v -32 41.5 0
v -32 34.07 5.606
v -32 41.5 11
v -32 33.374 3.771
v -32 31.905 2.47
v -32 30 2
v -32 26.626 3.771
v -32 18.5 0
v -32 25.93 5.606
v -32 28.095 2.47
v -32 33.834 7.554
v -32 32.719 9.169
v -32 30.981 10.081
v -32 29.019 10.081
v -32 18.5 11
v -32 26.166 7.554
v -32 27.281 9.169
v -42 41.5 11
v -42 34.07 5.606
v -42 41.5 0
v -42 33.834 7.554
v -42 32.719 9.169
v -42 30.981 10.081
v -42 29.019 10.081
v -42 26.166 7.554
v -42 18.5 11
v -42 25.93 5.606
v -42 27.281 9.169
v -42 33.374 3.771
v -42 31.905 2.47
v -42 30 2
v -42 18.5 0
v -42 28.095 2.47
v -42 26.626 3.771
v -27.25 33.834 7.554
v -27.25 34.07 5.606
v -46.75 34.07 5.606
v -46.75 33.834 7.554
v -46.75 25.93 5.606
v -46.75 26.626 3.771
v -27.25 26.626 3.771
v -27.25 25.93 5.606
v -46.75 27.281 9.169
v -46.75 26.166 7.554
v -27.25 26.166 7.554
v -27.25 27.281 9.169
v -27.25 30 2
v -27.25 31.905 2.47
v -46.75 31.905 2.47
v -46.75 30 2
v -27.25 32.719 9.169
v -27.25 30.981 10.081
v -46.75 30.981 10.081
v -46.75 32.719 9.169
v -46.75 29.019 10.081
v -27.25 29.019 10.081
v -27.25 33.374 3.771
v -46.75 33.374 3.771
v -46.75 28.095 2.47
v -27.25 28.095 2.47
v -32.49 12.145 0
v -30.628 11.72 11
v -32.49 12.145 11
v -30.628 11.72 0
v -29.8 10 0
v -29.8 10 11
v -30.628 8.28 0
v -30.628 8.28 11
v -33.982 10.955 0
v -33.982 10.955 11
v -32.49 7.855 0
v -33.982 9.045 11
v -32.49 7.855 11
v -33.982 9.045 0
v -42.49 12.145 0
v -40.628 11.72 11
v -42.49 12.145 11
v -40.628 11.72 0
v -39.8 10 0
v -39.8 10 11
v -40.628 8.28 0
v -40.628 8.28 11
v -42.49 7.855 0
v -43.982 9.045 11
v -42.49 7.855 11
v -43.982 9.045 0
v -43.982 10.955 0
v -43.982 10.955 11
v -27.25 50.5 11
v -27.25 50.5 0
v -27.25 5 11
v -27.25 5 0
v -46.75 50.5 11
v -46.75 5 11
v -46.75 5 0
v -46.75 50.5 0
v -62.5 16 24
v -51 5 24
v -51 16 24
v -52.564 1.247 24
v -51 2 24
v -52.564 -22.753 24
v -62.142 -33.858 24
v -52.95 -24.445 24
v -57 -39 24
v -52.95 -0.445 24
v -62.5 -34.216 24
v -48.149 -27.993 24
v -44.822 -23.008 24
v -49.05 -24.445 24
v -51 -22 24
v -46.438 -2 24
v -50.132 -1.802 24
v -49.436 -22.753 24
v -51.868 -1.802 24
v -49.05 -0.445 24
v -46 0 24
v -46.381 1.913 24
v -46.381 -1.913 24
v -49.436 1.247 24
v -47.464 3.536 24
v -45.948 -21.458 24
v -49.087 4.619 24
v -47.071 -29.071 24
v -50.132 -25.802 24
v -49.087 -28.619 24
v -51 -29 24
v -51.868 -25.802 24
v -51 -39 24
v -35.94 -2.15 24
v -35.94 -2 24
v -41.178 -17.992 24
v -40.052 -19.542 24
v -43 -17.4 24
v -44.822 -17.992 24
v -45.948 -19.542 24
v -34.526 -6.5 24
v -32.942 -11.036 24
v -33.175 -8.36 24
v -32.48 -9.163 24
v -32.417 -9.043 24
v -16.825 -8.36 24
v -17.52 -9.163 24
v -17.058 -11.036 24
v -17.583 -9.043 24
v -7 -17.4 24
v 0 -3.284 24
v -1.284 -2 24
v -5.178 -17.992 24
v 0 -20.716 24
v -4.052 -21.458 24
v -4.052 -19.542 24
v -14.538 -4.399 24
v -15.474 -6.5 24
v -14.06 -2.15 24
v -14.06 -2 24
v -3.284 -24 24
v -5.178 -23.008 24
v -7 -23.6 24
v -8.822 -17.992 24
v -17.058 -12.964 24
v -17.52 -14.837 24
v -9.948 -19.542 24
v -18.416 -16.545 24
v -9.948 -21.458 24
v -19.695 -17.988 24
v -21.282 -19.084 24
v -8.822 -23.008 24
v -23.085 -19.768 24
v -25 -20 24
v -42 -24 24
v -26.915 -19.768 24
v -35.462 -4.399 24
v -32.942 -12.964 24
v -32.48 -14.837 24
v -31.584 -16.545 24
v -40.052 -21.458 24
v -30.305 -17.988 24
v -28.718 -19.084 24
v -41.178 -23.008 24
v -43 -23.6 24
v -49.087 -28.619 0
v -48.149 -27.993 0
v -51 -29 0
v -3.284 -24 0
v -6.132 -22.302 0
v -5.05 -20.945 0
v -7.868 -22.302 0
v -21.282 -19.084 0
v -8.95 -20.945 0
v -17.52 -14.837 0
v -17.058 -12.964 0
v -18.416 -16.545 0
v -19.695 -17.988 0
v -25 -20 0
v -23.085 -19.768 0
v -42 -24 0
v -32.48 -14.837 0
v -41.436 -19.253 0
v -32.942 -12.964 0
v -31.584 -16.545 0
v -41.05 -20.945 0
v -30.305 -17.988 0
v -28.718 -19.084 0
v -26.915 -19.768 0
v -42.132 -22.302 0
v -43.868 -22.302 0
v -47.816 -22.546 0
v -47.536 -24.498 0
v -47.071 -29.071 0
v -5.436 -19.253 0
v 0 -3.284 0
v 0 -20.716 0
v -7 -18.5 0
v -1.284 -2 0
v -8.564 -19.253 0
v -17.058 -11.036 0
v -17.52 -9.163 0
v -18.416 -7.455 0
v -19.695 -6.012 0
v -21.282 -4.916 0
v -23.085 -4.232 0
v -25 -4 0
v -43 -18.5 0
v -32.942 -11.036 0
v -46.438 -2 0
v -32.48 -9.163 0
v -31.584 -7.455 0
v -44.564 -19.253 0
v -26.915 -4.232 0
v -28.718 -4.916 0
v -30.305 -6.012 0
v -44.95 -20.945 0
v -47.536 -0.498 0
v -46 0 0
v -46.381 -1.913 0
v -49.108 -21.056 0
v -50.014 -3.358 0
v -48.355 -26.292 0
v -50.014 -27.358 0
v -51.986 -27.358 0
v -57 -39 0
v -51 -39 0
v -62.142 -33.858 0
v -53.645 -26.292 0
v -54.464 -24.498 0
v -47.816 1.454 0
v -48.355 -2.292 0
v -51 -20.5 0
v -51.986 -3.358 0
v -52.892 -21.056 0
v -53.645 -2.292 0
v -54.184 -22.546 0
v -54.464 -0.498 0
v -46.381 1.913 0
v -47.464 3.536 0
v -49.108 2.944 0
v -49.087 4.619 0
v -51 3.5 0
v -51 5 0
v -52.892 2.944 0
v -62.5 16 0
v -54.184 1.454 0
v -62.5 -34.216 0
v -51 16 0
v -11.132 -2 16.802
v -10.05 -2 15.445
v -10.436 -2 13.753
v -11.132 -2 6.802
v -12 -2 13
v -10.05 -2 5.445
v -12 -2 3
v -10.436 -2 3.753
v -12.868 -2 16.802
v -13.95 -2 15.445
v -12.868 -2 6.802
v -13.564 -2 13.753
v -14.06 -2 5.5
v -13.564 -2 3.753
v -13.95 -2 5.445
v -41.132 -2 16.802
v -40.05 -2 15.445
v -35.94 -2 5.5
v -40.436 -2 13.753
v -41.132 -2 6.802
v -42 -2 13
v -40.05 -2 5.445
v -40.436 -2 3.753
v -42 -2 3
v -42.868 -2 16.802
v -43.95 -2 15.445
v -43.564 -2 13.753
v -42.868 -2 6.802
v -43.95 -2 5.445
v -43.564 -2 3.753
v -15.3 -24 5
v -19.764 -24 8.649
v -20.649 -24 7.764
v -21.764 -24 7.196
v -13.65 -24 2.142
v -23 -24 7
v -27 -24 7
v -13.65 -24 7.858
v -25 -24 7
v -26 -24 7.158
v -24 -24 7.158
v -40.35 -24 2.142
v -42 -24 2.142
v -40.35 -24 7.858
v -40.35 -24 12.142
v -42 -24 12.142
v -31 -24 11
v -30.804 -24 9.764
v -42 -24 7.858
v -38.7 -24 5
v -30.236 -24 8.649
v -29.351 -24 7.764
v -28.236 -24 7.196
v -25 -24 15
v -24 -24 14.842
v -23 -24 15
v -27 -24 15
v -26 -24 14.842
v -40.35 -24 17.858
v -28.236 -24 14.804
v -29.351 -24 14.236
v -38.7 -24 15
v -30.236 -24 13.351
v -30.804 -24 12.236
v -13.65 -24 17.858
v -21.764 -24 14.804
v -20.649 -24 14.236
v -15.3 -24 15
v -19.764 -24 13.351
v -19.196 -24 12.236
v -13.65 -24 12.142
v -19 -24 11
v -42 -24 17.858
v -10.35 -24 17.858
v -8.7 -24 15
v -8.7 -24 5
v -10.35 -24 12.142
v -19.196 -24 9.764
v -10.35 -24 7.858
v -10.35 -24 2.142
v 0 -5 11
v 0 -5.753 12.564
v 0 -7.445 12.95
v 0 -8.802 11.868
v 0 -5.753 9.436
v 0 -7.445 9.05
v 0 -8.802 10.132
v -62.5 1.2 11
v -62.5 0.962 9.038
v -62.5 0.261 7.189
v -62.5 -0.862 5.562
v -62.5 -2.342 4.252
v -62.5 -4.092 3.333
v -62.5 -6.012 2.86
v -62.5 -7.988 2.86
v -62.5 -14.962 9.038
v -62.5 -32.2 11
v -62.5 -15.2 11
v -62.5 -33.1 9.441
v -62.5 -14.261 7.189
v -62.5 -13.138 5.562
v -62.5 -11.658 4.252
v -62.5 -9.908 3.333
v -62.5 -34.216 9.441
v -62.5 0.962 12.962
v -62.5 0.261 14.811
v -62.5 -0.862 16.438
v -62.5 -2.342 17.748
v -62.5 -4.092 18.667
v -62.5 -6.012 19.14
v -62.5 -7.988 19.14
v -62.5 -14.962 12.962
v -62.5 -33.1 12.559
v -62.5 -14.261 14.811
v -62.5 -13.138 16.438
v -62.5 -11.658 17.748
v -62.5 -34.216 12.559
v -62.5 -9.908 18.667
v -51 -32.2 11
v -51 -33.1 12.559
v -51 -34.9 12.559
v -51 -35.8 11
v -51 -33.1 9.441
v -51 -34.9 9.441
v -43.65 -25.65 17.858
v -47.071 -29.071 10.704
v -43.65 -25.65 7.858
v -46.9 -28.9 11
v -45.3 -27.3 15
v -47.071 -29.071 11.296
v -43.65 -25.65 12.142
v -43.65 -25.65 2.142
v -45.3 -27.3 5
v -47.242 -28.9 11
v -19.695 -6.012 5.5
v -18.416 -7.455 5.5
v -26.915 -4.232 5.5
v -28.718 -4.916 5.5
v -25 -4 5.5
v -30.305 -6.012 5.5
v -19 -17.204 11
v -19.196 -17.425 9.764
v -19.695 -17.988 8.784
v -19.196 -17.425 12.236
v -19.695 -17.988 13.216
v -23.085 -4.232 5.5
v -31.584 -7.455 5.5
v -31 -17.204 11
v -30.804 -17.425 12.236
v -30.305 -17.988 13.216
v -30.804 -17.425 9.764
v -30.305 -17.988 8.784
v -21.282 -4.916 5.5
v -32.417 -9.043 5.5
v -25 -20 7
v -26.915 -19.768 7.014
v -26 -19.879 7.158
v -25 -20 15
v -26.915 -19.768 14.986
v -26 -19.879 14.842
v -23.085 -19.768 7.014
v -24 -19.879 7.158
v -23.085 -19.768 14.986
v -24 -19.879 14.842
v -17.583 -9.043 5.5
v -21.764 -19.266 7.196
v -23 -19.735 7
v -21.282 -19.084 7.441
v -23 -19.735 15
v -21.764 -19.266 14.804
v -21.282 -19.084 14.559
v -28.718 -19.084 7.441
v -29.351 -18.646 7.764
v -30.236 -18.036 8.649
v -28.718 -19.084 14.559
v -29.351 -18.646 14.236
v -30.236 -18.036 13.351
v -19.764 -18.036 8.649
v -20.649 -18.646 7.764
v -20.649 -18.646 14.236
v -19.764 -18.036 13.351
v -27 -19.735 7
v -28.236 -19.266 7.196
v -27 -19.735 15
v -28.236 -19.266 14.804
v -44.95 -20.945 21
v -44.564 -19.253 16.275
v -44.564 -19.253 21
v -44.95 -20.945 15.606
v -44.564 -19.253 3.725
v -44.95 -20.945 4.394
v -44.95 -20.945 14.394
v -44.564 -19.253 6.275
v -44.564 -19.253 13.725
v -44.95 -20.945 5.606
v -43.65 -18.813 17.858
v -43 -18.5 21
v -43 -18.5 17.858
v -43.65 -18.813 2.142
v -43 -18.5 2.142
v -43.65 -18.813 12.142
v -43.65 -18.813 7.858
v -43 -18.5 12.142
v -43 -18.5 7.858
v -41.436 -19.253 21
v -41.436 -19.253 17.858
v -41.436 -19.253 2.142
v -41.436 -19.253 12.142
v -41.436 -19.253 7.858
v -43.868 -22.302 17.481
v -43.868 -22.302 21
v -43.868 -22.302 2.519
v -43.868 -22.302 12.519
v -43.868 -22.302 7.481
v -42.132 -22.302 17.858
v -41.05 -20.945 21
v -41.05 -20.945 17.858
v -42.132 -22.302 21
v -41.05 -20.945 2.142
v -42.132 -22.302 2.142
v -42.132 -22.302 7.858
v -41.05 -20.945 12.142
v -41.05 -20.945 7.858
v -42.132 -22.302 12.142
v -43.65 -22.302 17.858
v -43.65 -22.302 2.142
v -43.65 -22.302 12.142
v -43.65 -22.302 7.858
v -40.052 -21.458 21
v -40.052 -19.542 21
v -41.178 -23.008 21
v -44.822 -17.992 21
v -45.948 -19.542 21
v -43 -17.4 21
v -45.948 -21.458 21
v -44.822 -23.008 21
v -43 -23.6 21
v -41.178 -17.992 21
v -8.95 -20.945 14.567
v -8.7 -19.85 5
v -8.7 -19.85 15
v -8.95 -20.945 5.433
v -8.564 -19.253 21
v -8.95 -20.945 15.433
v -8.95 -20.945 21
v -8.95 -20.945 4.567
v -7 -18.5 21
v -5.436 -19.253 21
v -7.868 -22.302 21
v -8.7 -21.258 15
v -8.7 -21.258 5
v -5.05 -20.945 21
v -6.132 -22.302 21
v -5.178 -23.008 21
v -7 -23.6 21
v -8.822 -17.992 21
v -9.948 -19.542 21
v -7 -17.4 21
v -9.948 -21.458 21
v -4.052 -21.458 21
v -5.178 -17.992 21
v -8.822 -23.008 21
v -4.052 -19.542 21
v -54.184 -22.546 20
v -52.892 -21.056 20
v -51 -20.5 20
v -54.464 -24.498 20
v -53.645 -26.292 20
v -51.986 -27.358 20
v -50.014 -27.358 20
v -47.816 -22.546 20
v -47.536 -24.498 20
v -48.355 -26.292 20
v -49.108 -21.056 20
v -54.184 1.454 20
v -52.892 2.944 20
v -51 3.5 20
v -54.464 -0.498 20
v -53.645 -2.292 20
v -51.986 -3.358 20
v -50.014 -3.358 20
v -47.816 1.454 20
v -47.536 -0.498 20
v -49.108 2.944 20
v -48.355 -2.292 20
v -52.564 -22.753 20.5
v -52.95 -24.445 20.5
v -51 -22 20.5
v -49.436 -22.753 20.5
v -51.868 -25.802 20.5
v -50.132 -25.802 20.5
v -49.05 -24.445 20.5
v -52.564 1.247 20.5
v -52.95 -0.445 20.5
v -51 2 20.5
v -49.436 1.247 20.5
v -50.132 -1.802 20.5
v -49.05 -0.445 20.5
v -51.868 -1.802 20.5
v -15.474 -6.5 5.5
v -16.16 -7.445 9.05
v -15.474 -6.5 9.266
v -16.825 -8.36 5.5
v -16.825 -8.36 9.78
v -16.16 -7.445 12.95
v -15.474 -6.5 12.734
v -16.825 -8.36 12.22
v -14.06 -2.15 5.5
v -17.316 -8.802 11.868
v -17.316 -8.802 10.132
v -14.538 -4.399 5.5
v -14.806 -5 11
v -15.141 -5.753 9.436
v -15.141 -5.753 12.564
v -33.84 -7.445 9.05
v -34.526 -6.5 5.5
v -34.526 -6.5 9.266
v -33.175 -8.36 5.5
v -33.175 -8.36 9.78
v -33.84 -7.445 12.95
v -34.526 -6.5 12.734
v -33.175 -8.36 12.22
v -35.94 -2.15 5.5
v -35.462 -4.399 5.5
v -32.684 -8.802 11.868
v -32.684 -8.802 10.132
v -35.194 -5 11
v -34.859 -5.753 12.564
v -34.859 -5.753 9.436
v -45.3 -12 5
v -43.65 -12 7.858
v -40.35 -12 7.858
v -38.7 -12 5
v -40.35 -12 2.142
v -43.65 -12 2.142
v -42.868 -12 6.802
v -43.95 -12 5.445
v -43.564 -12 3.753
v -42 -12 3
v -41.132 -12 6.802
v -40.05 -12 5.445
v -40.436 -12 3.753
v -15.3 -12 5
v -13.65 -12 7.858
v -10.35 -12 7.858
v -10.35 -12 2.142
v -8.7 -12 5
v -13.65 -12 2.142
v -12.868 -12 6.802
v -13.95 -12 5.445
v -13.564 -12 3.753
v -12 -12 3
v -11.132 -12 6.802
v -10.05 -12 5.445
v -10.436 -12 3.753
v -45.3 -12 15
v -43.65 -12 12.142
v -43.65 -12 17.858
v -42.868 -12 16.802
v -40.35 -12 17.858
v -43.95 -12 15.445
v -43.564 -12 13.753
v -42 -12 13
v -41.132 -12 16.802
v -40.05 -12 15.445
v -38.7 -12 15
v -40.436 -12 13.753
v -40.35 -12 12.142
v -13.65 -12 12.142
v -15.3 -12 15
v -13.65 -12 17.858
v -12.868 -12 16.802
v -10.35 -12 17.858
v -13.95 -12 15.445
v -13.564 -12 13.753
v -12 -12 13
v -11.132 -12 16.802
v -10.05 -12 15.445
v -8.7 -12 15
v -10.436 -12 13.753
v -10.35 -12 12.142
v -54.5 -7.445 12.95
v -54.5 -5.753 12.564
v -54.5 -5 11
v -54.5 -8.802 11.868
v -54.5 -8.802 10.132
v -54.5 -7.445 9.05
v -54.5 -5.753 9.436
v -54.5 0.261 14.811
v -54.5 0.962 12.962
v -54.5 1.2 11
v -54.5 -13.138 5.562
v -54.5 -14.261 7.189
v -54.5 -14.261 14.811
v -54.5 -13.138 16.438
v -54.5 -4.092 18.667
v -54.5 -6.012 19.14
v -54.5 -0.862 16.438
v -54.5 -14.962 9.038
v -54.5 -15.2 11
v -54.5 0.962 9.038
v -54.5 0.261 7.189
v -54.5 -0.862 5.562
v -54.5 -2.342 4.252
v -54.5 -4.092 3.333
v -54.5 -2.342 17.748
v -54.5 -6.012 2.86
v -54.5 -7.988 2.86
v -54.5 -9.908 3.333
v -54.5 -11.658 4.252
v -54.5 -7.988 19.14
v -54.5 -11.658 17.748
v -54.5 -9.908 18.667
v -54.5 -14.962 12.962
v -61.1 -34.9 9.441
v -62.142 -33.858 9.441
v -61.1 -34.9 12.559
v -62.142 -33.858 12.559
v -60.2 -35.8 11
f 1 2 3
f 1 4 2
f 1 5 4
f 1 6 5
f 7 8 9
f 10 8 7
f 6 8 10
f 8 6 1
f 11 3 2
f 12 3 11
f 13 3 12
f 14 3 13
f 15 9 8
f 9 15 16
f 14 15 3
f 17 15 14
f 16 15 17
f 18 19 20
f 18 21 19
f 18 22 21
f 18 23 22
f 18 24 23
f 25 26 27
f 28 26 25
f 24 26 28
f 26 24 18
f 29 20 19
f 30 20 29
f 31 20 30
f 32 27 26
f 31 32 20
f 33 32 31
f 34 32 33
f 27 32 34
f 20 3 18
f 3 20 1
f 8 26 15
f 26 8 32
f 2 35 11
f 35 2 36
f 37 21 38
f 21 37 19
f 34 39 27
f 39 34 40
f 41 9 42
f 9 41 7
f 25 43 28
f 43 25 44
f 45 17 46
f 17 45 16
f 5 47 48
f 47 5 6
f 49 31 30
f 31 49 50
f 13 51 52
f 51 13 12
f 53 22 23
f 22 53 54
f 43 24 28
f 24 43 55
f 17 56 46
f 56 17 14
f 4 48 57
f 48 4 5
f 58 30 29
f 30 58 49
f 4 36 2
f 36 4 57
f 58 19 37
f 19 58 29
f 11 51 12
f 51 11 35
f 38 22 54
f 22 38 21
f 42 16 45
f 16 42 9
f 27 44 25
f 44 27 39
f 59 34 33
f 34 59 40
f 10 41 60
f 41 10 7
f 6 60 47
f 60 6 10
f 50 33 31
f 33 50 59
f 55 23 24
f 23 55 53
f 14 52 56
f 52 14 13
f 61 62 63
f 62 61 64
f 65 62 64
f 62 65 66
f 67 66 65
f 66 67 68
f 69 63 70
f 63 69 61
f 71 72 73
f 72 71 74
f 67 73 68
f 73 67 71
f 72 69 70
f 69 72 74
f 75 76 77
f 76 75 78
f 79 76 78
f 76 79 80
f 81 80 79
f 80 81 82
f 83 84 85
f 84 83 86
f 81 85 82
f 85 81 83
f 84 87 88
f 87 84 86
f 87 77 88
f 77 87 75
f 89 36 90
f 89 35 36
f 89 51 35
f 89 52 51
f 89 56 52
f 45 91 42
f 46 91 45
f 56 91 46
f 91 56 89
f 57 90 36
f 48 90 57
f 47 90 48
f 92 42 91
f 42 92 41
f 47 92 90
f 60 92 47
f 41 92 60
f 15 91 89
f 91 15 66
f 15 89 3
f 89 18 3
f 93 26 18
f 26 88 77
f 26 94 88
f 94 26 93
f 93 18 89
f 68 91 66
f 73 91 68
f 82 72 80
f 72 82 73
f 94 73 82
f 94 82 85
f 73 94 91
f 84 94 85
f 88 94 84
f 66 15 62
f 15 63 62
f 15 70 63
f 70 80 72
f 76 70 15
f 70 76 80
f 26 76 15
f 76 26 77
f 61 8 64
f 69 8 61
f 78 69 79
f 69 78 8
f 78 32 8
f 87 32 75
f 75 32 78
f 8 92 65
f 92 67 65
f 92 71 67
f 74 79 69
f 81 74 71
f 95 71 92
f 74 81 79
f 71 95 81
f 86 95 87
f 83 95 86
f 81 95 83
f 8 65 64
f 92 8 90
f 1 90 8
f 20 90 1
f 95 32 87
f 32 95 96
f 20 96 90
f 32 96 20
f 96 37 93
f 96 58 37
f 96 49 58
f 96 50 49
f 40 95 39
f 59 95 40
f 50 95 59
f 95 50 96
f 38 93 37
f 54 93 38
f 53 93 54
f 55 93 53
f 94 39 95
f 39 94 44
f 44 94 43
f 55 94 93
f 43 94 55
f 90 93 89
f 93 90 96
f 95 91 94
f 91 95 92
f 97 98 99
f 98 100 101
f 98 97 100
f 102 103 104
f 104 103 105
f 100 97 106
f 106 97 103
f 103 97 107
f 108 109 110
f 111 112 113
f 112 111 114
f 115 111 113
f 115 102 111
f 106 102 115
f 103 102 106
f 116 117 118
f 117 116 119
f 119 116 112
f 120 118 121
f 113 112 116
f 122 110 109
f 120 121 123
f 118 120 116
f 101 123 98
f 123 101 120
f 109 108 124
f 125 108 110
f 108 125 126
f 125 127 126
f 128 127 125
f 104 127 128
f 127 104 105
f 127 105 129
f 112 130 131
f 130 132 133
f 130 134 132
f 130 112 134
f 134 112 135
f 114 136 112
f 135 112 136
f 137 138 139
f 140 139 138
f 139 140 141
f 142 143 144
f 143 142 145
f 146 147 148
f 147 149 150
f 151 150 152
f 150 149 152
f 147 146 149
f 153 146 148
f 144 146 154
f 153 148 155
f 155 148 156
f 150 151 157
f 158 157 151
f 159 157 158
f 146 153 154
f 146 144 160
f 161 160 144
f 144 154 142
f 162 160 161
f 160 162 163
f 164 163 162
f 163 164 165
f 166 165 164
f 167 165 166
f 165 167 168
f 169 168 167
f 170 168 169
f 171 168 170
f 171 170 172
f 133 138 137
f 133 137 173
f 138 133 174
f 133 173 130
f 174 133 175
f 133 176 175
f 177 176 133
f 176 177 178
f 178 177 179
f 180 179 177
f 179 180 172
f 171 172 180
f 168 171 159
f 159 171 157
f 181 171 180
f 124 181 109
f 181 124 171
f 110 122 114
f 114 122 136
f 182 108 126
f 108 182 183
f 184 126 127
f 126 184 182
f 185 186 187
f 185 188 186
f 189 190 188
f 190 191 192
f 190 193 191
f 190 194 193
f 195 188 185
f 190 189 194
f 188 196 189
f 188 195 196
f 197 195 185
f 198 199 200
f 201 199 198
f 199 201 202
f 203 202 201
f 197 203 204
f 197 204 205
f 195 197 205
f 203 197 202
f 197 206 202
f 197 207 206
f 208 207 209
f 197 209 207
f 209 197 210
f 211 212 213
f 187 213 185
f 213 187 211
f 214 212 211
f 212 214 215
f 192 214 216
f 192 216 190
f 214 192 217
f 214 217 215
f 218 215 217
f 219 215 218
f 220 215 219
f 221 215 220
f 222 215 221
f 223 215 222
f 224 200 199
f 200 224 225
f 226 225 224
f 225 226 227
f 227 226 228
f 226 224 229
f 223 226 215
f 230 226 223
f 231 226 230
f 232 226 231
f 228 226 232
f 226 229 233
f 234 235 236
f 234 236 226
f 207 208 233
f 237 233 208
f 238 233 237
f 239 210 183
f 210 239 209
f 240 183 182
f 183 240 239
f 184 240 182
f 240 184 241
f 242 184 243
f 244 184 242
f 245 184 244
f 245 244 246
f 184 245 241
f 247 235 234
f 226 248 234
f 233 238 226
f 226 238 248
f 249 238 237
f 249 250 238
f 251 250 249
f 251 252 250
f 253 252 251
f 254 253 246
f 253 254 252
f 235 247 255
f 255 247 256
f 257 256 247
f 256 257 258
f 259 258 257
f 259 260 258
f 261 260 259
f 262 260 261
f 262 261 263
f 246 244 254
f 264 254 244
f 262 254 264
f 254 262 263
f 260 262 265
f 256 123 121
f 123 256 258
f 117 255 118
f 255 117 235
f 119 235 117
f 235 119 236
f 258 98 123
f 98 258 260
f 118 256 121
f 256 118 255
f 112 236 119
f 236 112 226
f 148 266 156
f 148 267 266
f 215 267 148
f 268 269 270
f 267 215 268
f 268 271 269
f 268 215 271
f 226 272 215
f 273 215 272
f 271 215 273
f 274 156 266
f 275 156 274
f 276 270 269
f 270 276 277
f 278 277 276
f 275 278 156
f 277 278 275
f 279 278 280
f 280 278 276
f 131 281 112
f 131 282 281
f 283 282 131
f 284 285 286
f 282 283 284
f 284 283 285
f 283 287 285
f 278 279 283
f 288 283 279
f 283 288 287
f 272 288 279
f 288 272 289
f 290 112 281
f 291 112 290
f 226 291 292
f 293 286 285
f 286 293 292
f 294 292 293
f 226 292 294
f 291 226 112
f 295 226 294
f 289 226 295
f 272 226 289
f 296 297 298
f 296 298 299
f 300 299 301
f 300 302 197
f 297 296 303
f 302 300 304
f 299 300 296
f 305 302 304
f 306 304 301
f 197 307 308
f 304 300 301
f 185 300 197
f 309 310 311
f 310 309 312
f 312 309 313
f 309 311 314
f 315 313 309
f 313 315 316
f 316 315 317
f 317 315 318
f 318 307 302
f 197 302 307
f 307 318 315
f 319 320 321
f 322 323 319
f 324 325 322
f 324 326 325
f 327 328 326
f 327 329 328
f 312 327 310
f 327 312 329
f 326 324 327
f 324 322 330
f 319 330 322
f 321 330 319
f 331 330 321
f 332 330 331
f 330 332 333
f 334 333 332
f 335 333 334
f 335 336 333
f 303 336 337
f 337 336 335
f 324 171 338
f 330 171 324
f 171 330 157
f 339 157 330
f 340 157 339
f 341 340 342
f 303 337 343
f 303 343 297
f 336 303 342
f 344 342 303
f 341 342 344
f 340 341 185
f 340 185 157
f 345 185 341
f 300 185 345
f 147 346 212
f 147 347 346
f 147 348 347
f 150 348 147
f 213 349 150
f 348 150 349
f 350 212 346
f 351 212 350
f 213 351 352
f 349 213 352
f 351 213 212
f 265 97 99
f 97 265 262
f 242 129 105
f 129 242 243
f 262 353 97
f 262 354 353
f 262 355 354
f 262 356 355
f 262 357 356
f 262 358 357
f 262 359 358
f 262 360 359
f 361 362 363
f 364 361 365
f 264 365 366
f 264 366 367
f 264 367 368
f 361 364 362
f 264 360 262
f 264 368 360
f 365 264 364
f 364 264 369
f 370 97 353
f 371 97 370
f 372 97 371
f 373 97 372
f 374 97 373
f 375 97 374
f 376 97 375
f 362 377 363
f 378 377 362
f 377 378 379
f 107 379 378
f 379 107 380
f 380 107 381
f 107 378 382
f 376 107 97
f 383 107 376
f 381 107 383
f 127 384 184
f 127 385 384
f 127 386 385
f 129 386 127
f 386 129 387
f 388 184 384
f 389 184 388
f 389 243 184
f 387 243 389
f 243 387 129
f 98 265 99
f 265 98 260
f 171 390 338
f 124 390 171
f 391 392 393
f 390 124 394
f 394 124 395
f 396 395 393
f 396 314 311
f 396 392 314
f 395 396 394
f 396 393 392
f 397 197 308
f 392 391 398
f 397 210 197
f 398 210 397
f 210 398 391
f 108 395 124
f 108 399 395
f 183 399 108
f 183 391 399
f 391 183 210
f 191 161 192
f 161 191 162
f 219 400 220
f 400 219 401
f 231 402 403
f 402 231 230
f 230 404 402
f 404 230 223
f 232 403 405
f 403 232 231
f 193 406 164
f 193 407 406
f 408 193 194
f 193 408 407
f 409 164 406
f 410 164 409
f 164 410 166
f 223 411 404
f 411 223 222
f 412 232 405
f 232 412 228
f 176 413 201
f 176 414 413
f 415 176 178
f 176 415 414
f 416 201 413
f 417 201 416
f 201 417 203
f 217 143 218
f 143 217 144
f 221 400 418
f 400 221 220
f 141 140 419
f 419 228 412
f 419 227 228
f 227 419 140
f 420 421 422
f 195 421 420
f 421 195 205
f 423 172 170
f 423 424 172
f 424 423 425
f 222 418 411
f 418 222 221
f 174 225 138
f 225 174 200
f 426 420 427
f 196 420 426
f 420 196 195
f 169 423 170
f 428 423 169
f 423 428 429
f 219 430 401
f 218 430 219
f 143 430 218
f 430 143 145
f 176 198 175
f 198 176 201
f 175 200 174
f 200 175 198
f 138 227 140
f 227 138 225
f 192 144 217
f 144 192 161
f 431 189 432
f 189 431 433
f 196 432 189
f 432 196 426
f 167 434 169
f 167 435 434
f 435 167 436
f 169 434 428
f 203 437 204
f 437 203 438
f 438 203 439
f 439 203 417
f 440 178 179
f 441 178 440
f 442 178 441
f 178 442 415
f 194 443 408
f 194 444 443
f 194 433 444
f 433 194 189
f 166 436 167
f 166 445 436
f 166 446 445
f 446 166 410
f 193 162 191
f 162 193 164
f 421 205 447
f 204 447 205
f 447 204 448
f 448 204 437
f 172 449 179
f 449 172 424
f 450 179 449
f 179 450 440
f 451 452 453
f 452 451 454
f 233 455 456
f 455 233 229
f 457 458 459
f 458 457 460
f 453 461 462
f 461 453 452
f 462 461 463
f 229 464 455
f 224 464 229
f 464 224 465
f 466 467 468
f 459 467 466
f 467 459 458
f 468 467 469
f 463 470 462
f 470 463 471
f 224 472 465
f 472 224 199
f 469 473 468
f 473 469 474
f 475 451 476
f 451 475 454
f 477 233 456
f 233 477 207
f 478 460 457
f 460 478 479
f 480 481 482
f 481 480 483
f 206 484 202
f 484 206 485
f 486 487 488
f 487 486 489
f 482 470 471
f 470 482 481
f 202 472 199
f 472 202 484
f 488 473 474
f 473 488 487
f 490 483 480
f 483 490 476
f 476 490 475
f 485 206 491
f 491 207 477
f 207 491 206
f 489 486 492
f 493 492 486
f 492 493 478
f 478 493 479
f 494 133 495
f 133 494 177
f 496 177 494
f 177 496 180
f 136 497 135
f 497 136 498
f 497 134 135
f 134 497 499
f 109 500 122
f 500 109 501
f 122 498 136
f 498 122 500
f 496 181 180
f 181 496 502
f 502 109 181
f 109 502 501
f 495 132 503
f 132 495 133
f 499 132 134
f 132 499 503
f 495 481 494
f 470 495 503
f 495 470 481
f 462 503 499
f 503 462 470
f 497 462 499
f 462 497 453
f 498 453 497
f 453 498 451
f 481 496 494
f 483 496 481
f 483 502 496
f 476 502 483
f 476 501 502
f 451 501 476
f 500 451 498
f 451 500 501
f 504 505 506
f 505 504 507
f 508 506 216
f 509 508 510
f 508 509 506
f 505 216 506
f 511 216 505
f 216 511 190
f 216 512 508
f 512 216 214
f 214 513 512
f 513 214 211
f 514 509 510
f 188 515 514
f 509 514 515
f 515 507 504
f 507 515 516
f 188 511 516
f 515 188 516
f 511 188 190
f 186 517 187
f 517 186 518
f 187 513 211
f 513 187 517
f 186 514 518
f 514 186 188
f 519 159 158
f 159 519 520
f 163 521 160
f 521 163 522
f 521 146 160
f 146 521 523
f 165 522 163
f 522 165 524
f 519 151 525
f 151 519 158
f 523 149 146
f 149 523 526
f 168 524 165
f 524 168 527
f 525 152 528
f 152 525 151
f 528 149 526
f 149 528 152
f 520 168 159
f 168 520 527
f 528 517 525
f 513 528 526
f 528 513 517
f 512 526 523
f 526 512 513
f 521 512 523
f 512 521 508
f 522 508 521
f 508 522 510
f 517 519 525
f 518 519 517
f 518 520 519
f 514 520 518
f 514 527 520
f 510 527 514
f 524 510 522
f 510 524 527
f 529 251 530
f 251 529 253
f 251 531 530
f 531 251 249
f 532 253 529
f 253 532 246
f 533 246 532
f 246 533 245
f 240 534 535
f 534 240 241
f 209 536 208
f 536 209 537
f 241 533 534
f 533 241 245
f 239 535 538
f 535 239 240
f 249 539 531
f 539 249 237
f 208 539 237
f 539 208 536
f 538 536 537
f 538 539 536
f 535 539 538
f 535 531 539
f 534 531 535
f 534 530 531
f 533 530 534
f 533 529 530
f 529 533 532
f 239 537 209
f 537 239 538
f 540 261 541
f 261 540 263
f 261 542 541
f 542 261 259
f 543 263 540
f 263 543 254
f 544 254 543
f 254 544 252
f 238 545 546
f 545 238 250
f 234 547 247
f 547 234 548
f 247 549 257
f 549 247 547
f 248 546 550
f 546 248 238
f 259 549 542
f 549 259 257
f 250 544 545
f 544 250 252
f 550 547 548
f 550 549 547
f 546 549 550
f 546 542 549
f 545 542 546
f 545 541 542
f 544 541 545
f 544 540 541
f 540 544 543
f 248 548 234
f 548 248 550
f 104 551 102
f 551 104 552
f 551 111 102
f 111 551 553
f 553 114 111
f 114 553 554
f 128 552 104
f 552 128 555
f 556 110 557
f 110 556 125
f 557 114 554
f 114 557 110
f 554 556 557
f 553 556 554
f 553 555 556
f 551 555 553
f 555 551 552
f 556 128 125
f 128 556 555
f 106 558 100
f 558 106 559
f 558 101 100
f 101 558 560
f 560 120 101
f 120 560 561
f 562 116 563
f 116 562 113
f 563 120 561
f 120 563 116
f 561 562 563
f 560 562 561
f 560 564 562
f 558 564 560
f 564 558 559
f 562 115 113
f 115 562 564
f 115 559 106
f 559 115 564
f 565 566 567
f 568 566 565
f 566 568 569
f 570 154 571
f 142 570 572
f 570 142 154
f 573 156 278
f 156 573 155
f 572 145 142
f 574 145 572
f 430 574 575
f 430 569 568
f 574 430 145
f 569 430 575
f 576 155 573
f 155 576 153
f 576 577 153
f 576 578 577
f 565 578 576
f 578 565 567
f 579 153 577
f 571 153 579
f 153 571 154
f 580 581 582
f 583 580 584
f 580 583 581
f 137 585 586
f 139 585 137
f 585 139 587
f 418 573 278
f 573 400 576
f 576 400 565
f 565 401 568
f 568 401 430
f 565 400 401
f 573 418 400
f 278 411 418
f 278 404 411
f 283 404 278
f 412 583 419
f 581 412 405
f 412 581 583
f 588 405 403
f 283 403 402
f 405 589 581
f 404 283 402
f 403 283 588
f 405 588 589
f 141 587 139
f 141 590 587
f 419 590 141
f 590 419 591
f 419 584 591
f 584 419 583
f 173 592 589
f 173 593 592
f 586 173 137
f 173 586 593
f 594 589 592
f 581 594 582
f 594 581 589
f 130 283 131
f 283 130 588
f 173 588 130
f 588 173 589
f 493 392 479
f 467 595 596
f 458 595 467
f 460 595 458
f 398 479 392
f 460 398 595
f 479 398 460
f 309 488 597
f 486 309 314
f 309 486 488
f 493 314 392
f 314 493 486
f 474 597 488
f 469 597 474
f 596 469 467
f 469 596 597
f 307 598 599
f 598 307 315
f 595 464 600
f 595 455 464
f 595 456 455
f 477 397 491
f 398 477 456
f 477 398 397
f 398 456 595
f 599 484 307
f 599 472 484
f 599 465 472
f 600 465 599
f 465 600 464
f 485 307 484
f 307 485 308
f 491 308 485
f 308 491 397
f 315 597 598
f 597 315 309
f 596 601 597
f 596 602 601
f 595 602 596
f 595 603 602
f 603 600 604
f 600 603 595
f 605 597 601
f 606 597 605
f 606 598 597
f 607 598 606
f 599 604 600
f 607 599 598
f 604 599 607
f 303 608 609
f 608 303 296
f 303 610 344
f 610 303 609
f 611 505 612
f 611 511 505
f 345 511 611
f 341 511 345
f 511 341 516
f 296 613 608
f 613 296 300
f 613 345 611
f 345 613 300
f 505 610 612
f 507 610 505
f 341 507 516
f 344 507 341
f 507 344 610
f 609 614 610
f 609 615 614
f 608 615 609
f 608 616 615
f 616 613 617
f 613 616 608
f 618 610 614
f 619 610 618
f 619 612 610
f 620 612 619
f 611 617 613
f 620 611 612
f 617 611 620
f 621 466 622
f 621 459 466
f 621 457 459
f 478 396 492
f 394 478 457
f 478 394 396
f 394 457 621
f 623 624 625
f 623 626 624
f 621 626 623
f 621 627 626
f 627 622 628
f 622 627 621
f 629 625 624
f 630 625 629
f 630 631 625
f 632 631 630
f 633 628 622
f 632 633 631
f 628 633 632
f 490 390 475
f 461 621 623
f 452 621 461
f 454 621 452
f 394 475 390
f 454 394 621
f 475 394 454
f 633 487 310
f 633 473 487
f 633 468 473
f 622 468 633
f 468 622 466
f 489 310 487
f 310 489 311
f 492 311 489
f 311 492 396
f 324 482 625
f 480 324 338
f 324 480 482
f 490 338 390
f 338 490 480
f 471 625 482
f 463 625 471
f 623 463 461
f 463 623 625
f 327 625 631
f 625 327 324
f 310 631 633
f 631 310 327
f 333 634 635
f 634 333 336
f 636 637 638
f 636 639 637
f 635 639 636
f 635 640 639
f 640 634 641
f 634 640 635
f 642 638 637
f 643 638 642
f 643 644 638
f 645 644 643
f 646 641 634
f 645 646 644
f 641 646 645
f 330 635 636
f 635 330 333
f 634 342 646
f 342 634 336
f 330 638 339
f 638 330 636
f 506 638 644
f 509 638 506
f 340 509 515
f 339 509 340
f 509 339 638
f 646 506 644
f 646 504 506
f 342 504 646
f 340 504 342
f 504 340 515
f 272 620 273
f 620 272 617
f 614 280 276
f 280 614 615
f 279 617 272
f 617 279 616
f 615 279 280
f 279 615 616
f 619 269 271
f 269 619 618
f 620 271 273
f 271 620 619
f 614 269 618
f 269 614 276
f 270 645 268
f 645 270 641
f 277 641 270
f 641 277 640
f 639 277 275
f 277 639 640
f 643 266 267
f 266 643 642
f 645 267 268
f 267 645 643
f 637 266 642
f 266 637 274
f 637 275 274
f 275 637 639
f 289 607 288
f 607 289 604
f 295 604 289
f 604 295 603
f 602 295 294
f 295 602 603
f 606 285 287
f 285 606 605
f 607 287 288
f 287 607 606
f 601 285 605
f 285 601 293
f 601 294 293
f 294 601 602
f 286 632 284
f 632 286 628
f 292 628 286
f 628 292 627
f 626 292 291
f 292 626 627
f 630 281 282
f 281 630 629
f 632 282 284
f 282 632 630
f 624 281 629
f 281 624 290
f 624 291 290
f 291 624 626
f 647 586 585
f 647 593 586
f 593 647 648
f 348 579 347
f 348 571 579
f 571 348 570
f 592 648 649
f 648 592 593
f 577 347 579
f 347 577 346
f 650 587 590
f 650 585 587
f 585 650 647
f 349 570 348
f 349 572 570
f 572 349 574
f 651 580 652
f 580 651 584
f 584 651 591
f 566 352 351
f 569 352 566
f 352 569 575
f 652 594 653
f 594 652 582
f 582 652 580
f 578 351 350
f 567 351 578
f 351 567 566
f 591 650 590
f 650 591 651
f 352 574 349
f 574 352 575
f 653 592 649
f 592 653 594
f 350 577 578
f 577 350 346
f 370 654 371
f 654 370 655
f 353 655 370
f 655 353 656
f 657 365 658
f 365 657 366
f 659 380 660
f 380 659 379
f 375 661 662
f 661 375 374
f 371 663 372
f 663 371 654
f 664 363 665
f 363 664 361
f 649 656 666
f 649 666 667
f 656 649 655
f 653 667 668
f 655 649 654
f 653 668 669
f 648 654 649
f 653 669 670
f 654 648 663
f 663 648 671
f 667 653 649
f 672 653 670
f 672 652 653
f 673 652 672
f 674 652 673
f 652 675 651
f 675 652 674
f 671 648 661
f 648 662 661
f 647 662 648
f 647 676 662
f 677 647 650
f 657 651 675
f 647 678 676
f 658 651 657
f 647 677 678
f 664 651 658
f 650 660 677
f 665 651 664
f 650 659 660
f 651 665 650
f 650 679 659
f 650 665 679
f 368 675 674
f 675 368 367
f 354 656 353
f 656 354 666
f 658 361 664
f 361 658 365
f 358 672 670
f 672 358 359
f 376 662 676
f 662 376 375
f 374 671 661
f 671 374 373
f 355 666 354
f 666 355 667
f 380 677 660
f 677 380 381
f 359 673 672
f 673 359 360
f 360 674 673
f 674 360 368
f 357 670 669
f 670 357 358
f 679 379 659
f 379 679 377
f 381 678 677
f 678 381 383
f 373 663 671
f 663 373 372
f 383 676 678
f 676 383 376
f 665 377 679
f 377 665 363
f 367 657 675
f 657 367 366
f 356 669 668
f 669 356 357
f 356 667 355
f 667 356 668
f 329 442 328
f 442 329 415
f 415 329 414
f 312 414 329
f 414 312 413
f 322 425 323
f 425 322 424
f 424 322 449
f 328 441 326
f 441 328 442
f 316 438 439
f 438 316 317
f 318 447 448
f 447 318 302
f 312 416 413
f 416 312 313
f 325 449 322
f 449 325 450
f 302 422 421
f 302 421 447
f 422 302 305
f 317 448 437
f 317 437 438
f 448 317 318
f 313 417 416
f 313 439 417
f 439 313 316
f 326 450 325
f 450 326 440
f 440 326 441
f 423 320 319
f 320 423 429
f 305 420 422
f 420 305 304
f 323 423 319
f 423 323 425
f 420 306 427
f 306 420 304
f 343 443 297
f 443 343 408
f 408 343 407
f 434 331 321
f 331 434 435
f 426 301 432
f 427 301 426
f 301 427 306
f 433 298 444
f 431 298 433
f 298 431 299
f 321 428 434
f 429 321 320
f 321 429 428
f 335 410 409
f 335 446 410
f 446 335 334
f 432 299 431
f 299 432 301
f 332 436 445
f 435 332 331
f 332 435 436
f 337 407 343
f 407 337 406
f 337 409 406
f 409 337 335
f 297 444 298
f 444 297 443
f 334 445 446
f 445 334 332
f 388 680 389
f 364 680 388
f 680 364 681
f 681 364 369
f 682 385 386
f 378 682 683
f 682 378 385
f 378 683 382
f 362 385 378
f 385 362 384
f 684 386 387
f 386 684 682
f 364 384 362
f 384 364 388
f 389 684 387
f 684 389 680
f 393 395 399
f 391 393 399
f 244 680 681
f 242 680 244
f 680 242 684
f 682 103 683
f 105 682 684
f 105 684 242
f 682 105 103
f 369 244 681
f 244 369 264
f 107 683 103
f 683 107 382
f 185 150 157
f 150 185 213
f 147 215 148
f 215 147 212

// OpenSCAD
// file: ../configuration.scad
x_rod_distance = 45;

// Select your belt type ******************************************************

//T2.5
belt_tooth_distance = 2.5;
belt_tooth_ratio = 0.5;

//T5 (strongly discouraged)
//belt_tooth_distance = 5;
//belt_tooth_ratio = 0.75;

//HTD3
//belt_tooth_distance = 3;
//belt_tooth_ratio = 0.75;

//MXL
//belt_tooth_distance = 2.032;
//belt_tooth_ratio = 0.64;

// Select your hot-end mount ******************************************************

// 0 = none; 1 = groove-mount (J-head/MakerGear etc.)
hotend_mount = 1;

hotend_groovemount_depth = 5;
hotend_groovemount_diameter = 11.05;
// main file
// PRUSA iteration3
// Compact extruder
// GNU GPL v3
// Josef Průša <iam@josefprusa.cz> and contributors
// http://www.reprap.org/wiki/Prusa_Mendel
// http://prusamendel.org

include <../configuration.scad>

hotend_groovemount_depth = 8;
hotend_groovemount_diameter = 16.4;


module motor_dummy(){
	translate([-22,-22,-5]) %cube([44,44,5]);
	translate([18,18,-5]) %cylinder(r=2, h=24);
	translate([18,-18,-5]) %cylinder(r=2, h=24);
	translate([-18,18,-5]) %cylinder(r=2, h=24);
	translate([-18,-18,-5]) %cylinder(r=2, h=24);
	translate([-22+2.5+10,0,-5]) %cylinder(r=2.5, h=7);
	
}

module extruder_base(){
 // Main body
 translate([-1,-2,0]) cube([22,56,24]);
 // Extruder plate mount
 if (hotend_mount == 1) { // groove-mount
  translate([-16,49,0]) cube([55,5 + hotend_groovemount_depth - 1.5,24]);
 } else {
  //translate([-16,49,0]) cube([55,5,24]);
 color("green") translate([-19,49,0]) cube([72,5,24]); // -> JMMP
 }
 
 // Carriage mount cylinders
 translate([11,25,0]){
  translate([-12,24,0]) cylinder(r=5, h=24);
  translate([12,24,0]) cylinder(r=5, h=24);
 }

 // Smoother join
 translate([1,38,0]) rotate([0,0,45])  cube([10,10,24]);
}

module extruder_holes(){
 translate([11,25,0]){ // Translate to center of the main block
  // Main shaft opening
  translate([0,-2,-1]) cylinder(r=8, h=26);

  // Lower motor mount hole
  translate([-8.5,18-2,-1]) cylinder(r=2, h=35);
  translate([-8.5,18-2,21]) cylinder(r=3.1, h=35);
  // Upper motor mount hole
  translate([-8.5,-18-2,-1]) cylinder(r=2, h=35);
  translate([-8.5,-18-2,21]) cylinder(r=3.1, h=35);
  // Idler motor mount hole
  translate([-8.5+36,18-2,-1]) cylinder(r=2, h=35);
  translate([-8.5+36,18-2,21]) cylinder(r=3.1, h=35);

  // Carriage mount right screw head hole
  translate([-12,24,-3]) cylinder(r=3.5, h=23);
  // Carriage mount left screw head hole
  translate([12,24,-3]) cylinder(r=3.5, h=23);
  // Carriage mount right screw hole
  translate([-12,24,20.5]) cylinder(r=2, h=23);
  // Carriage mount left screw head hole
  translate([12,24,20.5]) cylinder(r=2, h=23);
  // Idler bearing cutout
  translate([11,0-2,-4.5+10]) cylinder(r=11, h=20);
 }
 // Filament path
 translate([1.5+11+3.5,65,11]) rotate([90,0,0]) cylinder(r=2, h=70);
 if (hotend_mount == 1) {
  // Hole for hotend
  translate([1.5+11+3.5,65,11]) rotate([90,0,0]) cylinder(r=hotend_groovemount_diameter/2, h=12.5);
 }
 // Hole for drive gear check
 translate([1.5+11+3.5-30,25,11]) rotate([90,0,90]) cylinder(r=4, h=70, $fn=20);
 translate([1.5+11+3.5-30,23,11]) rotate([90,0,90]) cylinder(r=4, h=70, $fn=20);
 translate([1.5+11+3.5-30,21,11]) rotate([90,0,90]) cylinder(r=4, h=70, $fn=20);

 // Left extruder plate mounting hole
 translate([1.5+11+3.5+27,65,11]) rotate([90,0,0]) cylinder(r=1.8, h=70);// JMMP
 translate([1.5+11+3.5+15,47,11]) rotate([90,0,0]) cylinder(r=3.1, h=70, $fn=6);
 // Right extruder plate mounting hole
 translate([1.5+11+3.5-27,65,11]) rotate([90,0,0]) cylinder(r=1.8, h=70);//JMMP
 translate([1.5+11+3.5-25,47,11]) rotate([90,0,0]) cylinder(r=3.1, h=70, $fn=6);

  // Idler mounting holse
  translate([11,25,10]){
   // Nut traps
   translate([-30,15,-5]) rotate([0,90,0]) rotate([0,0,30]) cylinder(r=3.3, h=30, $fn=6);
   translate([-30,-15,-5]) rotate([0,90,0]) rotate([0,0,30]) cylinder(r=3.3, h=30, $fn=6);
   translate([-30,15,5]) rotate([0,90,0]) rotate([0,0,30]) cylinder(r=3.3, h=30, $fn=6);
   translate([-30,-15,5]) rotate([0,90,0]) rotate([0,0,30]) cylinder(r=3.3, h=30, $fn=6);
   // Screws
   translate([-30,-15,-5]) rotate([0,90,0]) cylinder(r=2, h=70);
   translate([-30,-15,5]) rotate([0,90,0]) cylinder(r=2, h=70);
   translate([-30, 15,-5]) rotate([0,90,0]) cylinder(r=2, h=70);
   translate([-30, 15,5]) rotate([0,90,0]) cylinder(r=2, h=70);
	}

 translate([58,46,-1]) rotate([0,0,45]) cube([20,20,26]); // JMMP
 translate([46,13,-1]) rotate([0,0,45]) cube([20,20,26]);
 translate([-25,46,-1]) rotate([0,0,45]) cube([20,20,26]);//JMMP
 translate([-22,24,-1]) rotate([0,0,45]) cube([20,20,26]);
 translate([-8,-20,-1]) rotate([0,0,45]) cube([20,20,26]);
 translate([30,-20,-1]) rotate([0,0,45]) cube([20,20,26]);
}

module extruder_idler_base(){
 translate([0.25,0,0]) cube([19.5,45.5,8+3]);
	
}

module extruder_idler_holes(){
 translate([10,25,0]){
  // Main cutout
  cube([10,23,25], center= true);
  // Idler shaft
  translate([-12,0,4.1+2])rotate([0,90,0])cylinder(r=4.1, h=24);
  // Screw holes
  translate([5,-20,-1])cylinder(r=2.2, h=24);
  translate([-5,-20,-1])cylinder(r=2.2, h=24);
 }
}


// Idler final part
module idler(){
 difference(){
  extruder_idler_base();
  extruder_idler_holes();
 }
}

//translate([10,0,1]) rotate([0,-90,0]) idler();
translate([-47,5,0])  idler();
// Extruder final part
module extruder(){
 translate([-23,2,0])difference(){
  extruder_base();
  extruder_holes();
 }
}

rotate ([0,0,90]) extruder();
//translate([-2.5,25,0]) motor_dummy();
//idler();
